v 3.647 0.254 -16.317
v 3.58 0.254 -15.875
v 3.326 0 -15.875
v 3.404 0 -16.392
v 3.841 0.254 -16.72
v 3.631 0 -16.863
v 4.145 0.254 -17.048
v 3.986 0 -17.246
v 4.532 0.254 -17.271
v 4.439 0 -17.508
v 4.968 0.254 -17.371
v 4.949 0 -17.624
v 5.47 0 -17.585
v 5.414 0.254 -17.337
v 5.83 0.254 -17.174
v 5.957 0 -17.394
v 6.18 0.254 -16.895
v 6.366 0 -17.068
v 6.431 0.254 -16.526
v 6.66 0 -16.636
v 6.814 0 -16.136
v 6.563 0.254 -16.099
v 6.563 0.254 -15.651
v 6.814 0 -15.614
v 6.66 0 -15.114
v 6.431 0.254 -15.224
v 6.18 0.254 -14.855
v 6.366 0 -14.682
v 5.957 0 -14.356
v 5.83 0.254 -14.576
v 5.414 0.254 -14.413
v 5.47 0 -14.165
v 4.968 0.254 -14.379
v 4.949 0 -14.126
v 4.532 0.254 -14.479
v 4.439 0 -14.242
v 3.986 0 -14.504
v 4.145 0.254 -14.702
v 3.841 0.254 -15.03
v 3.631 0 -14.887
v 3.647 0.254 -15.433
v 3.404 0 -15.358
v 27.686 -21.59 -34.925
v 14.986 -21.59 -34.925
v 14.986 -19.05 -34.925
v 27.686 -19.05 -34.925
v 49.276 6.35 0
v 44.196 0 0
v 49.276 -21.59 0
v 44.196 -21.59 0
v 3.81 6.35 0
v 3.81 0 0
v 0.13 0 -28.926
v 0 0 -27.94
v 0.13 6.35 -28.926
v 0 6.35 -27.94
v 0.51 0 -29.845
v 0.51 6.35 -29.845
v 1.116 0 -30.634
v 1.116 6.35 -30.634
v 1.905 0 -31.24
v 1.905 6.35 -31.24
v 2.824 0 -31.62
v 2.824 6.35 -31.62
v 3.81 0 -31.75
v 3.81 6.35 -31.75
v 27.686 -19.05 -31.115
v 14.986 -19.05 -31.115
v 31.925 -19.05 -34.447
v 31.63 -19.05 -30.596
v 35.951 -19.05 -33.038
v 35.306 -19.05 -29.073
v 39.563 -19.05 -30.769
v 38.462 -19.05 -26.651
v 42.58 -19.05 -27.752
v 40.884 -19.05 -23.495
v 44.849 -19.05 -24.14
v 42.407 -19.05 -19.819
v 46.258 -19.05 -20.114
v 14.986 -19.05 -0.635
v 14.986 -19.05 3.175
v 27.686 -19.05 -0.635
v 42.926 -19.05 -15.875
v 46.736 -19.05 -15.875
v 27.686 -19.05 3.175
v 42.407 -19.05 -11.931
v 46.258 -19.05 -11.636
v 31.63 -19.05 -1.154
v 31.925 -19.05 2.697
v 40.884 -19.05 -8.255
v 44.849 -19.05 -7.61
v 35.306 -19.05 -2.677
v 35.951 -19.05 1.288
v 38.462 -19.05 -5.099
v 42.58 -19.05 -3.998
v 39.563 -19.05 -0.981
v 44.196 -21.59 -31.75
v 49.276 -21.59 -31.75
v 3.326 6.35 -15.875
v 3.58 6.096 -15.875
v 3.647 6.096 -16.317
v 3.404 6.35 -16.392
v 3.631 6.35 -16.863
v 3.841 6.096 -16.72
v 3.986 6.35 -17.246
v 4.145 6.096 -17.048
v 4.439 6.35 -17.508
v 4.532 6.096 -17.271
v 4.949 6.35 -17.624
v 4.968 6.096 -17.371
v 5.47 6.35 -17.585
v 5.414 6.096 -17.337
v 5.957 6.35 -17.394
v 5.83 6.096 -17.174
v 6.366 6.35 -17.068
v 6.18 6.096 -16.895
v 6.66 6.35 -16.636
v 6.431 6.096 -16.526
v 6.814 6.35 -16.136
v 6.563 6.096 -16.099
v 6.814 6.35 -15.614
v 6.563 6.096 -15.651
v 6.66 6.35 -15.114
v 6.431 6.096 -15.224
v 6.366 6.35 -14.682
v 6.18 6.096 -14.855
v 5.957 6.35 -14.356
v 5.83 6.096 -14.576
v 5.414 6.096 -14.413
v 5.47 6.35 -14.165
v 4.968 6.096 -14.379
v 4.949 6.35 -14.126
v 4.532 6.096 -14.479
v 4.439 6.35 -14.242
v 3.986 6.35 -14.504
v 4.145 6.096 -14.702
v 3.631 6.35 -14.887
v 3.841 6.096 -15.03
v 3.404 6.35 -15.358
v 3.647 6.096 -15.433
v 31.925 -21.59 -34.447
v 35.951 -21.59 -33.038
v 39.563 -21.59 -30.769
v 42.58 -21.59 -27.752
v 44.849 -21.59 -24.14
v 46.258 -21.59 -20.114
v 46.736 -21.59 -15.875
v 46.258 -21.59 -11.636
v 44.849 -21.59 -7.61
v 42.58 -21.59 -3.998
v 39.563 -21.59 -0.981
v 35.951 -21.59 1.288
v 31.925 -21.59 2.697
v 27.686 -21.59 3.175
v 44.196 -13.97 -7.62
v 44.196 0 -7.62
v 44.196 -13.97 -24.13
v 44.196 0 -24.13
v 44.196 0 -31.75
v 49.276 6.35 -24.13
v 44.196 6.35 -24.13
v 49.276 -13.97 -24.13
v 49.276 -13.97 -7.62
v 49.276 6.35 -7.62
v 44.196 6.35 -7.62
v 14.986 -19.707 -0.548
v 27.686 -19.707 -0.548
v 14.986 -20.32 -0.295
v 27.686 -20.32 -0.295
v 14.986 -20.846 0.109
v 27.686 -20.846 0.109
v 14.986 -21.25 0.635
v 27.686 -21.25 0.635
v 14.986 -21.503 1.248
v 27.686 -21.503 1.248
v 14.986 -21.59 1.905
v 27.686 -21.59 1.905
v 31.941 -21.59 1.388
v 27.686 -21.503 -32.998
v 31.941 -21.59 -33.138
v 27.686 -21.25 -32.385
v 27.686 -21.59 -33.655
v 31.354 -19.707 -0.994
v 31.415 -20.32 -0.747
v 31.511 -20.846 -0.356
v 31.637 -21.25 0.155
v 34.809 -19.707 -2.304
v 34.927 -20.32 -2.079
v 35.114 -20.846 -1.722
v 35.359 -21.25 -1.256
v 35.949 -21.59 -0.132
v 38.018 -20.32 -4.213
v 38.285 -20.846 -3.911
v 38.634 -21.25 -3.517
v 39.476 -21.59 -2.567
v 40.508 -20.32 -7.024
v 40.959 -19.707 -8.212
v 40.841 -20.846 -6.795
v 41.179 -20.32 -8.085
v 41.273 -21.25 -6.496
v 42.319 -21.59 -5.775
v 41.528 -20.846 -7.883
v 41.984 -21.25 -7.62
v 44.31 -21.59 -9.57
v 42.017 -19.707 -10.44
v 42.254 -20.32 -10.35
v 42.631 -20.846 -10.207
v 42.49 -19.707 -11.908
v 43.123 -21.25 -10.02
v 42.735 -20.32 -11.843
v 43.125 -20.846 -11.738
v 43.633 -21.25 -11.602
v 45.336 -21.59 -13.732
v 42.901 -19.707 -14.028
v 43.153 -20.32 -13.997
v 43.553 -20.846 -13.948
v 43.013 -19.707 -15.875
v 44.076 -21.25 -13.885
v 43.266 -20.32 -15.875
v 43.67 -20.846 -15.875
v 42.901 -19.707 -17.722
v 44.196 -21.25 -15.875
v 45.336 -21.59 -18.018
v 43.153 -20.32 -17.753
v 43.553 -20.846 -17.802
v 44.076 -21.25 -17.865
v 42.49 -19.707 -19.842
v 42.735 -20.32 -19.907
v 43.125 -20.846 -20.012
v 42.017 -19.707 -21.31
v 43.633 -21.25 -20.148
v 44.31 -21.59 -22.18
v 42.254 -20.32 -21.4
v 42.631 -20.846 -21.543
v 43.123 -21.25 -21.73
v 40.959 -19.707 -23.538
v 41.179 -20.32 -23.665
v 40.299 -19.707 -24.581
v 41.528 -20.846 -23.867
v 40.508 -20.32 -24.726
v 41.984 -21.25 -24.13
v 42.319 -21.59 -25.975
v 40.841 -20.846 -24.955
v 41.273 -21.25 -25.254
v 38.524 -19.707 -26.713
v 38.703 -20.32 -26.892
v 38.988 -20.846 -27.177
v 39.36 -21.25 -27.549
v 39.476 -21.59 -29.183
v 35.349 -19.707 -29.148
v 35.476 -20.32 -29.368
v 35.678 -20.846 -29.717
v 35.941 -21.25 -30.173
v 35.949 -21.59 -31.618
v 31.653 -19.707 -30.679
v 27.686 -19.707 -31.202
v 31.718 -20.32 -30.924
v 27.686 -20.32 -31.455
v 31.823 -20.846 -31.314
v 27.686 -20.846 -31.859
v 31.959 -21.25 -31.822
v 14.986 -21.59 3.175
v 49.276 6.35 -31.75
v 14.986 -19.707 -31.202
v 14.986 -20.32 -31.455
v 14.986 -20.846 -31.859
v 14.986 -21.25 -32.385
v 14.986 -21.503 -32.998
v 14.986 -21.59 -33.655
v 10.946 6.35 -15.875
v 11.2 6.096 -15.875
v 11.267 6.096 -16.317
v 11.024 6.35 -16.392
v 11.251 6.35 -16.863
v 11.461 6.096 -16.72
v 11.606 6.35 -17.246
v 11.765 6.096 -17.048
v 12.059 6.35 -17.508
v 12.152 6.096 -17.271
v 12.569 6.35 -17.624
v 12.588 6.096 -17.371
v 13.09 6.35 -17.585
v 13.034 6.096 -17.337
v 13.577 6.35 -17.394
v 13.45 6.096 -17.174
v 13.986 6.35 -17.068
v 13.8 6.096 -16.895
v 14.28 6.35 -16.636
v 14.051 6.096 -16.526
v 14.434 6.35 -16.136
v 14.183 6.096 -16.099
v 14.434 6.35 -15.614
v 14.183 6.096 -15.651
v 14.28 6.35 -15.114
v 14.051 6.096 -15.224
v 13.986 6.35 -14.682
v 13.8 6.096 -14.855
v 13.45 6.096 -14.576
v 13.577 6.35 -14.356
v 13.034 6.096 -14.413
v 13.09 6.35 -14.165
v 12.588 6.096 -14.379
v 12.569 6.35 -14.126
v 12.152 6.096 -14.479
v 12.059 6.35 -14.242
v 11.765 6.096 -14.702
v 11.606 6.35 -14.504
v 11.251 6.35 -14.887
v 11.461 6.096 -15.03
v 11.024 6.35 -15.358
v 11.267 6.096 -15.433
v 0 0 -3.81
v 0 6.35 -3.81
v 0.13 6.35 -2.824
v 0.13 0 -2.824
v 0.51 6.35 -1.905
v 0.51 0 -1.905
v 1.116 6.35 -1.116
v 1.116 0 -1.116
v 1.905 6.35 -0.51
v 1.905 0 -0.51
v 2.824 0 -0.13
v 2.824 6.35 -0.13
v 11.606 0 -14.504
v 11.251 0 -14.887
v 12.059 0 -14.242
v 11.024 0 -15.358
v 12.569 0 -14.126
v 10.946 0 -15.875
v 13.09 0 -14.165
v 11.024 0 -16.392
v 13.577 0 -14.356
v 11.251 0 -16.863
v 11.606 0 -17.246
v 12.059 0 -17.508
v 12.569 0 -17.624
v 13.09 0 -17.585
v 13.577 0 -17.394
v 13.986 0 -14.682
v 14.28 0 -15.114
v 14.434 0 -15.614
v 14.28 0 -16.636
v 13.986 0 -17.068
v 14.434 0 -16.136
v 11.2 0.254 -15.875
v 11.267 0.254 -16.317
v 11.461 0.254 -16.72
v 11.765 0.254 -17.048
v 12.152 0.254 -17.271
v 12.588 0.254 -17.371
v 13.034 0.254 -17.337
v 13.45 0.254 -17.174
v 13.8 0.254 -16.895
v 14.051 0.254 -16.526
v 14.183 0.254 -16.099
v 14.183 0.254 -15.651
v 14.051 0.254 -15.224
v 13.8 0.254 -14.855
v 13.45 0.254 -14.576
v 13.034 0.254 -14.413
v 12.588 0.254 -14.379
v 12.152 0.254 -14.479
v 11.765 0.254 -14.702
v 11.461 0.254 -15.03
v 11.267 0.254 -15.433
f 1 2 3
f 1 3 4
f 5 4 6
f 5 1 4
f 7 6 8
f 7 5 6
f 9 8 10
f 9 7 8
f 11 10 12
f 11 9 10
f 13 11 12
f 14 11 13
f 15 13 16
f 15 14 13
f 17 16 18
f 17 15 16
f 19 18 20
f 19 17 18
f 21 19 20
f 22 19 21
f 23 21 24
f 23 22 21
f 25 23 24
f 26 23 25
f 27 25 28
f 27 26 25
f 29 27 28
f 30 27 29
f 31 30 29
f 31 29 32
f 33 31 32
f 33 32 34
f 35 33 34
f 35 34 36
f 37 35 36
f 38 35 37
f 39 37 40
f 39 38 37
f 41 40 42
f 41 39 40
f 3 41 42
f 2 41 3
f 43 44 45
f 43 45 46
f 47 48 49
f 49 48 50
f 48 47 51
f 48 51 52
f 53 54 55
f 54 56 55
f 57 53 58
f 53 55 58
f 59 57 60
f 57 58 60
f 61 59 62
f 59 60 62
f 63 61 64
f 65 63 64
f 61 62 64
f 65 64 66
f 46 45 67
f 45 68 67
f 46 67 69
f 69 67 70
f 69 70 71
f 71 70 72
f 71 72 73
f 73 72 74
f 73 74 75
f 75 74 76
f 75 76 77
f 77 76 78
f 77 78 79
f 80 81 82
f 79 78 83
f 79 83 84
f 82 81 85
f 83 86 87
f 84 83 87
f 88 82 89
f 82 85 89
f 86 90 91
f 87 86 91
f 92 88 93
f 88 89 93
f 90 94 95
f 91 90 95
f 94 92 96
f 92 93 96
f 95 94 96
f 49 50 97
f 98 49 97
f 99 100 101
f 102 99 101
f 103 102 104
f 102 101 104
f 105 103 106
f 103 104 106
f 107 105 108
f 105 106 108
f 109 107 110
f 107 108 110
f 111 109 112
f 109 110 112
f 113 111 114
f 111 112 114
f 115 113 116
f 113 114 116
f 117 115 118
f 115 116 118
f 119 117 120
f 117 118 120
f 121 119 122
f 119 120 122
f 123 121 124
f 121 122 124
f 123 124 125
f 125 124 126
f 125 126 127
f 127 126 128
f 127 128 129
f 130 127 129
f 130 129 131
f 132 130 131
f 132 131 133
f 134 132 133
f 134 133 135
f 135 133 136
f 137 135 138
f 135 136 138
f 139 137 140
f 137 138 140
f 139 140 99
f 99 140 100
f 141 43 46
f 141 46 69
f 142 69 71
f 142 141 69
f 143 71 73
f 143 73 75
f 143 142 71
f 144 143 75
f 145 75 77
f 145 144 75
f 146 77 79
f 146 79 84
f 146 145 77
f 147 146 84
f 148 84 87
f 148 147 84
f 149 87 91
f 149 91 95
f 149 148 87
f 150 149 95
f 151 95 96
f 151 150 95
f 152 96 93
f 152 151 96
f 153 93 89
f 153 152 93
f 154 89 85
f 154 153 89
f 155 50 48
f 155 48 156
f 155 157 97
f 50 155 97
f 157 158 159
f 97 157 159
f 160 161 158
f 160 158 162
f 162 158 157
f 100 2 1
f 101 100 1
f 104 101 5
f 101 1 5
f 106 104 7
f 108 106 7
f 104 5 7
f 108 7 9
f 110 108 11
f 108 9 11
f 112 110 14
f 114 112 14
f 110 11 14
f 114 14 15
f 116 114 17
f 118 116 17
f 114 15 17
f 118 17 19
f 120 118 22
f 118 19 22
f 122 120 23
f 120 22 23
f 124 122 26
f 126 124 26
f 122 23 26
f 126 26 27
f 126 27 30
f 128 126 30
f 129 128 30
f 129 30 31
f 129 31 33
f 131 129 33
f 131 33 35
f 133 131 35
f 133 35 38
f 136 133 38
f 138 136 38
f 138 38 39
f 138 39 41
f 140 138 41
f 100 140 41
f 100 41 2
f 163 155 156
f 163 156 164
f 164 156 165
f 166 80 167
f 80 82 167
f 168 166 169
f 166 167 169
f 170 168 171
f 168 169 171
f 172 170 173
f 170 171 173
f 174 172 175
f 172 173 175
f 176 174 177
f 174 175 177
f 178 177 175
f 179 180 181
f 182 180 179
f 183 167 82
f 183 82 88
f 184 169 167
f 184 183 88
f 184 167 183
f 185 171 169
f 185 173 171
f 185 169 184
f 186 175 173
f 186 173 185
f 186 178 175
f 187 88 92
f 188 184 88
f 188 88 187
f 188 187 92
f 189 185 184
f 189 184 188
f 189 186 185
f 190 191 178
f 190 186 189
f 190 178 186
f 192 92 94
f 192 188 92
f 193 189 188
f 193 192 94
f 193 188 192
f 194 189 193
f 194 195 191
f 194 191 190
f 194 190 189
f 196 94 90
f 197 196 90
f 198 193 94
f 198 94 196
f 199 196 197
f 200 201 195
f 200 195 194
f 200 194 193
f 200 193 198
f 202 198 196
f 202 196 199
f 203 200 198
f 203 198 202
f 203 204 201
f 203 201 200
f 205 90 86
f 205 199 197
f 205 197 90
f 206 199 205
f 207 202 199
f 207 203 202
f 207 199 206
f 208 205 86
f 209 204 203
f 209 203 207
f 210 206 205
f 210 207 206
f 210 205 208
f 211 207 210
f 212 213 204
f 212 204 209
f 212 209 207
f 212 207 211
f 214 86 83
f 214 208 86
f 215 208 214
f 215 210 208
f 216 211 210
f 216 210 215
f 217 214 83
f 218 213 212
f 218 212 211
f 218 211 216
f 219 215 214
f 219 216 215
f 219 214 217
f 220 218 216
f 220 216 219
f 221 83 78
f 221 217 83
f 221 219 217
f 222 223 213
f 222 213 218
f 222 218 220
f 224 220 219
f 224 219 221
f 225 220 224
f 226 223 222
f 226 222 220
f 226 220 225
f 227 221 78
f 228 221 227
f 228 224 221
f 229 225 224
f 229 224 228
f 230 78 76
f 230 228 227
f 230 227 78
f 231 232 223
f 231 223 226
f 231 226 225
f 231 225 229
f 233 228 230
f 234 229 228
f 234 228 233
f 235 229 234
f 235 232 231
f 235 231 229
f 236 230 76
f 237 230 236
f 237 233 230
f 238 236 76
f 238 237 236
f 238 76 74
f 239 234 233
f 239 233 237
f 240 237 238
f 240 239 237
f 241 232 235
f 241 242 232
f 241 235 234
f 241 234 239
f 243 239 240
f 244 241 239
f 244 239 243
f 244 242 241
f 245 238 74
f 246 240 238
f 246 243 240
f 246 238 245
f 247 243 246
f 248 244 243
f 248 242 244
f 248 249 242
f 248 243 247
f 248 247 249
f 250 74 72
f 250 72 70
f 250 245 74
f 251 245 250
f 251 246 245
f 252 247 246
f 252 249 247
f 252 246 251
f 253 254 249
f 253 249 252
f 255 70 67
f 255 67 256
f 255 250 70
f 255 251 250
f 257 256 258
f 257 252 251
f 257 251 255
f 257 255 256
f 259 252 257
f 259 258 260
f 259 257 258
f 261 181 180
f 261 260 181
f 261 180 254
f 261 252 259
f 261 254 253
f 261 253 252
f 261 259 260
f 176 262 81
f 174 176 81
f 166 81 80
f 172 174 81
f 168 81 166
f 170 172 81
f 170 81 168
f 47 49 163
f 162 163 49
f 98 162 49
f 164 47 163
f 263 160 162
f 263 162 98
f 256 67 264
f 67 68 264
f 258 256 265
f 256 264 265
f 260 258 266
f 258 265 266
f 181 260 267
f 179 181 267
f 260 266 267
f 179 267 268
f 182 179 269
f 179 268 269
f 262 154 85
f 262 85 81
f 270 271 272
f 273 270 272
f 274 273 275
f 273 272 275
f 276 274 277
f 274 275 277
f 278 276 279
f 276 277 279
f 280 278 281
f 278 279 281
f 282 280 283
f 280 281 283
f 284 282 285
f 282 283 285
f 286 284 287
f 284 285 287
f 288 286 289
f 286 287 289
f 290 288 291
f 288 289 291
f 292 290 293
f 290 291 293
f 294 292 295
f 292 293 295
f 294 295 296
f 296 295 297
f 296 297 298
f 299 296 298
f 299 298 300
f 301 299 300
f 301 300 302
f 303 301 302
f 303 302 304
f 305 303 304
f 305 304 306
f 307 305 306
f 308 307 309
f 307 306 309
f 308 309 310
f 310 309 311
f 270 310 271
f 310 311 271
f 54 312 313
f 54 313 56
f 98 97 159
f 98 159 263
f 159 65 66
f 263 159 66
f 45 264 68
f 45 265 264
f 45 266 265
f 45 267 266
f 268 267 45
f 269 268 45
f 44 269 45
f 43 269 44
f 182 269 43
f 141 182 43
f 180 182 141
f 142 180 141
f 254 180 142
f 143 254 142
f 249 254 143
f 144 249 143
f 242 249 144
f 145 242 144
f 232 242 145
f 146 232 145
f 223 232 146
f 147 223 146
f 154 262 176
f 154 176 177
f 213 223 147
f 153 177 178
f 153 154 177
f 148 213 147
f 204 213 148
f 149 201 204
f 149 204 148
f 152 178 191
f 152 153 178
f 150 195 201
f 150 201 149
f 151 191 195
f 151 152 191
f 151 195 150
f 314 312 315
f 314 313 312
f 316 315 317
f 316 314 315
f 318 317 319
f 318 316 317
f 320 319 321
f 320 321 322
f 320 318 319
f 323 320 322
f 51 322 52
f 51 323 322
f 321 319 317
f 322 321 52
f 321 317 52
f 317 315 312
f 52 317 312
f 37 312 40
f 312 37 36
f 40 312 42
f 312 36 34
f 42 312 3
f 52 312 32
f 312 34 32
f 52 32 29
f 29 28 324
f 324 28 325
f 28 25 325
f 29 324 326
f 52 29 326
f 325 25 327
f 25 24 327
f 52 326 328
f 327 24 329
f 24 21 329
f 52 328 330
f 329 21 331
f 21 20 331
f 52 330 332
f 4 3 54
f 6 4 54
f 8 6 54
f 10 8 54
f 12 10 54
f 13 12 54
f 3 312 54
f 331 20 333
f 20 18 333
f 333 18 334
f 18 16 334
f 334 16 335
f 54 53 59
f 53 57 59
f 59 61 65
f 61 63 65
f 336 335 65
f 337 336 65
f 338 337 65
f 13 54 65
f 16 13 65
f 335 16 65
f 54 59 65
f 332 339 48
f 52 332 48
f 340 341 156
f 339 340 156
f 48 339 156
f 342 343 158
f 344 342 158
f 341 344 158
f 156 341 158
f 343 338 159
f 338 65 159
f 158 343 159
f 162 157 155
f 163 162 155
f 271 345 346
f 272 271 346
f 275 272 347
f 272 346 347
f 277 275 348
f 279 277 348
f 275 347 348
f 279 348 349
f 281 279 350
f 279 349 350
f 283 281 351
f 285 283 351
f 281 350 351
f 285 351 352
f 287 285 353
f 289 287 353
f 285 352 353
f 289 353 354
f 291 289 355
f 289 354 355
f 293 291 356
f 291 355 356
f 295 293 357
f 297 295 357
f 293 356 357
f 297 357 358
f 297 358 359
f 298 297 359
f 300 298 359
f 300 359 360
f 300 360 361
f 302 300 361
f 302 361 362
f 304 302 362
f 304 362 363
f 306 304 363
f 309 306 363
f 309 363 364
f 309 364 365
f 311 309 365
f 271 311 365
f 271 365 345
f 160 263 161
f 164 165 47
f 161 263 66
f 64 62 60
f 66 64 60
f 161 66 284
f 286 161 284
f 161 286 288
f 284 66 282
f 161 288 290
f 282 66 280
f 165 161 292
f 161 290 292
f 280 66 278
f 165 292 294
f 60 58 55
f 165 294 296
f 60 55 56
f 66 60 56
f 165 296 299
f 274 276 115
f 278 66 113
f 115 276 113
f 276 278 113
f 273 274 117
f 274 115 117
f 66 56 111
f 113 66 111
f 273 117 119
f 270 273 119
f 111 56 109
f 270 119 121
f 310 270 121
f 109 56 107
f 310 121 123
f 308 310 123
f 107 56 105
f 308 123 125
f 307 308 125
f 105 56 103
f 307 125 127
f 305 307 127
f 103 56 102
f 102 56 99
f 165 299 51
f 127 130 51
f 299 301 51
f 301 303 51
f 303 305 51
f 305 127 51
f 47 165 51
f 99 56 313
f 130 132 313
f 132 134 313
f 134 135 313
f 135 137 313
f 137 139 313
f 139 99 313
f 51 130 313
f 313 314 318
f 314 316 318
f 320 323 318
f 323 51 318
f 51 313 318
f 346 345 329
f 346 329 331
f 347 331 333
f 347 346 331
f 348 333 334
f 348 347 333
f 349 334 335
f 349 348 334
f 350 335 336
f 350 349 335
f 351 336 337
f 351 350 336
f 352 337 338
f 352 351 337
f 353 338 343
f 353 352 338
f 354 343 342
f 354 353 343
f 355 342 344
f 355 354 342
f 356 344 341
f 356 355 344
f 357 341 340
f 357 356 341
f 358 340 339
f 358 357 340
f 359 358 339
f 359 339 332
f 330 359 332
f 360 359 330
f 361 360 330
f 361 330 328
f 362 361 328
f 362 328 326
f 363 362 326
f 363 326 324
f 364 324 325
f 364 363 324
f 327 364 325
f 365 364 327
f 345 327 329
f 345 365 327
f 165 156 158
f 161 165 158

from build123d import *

# Parameters (mm, degrees)
SKETCH1_W             = 44.196
SKETCH1_H             = 31.75
BOSS_EXTRUDE1_DEPTH   = 6.35
F_3_0MM_DOWEL_HOLE1_D = 3
CHAMFER1_SIZE         = 0.254
FILLET2_R             = 3.81
BOSS_EXTRUDE4_DEPTH   = 5.08
EXTRUDE_THIN1_DEPTH   = 2.54
FILLET3_R             = 2.54


with BuildPart() as part:
    # Sketch1 → Boss-Extrude1 (new body)
    with BuildSketch(Plane(origin=(0, 0, 0), x_dir=(1, 0, 0), z_dir=(0, 1, 0))):
        with Locations((22.098, 15.875)):
            Rectangle(SKETCH1_W, SKETCH1_H)
    extrude(amount=BOSS_EXTRUDE1_DEPTH)

    # Ø3.0mm Dowel Hole1 (through all)
    with Locations(Plane(origin=(0, 6.35, 0), x_dir=(1, 0, 0), z_dir=(0, 1, 0))):
        with Locations((5.08, 15.875), (12.7, 15.875)):
            Hole(F_3_0MM_DOWEL_HOLE1_D / 2)

    # Chamfer1
    chamfer1_edges = [part.edges().sort_by_distance(p)[0] for p in [
        (14.2, 6.35, -15.875),
        (14.2, 0, -15.875),
        (6.58, 6.35, -15.875),
        (6.58, 0, -15.875),
    ]]
    chamfer(chamfer1_edges, length=CHAMFER1_SIZE)

    # Fillet2
    fillet2_edges = [part.edges().sort_by_distance(p)[0] for p in [
        (0, 3.175, -31.75),
        (0, 3.175, 0),
    ]]
    fillet(fillet2_edges, radius=FILLET2_R)

    # Sketch6 → Boss-Extrude4 (add)
    with BuildSketch(Plane(origin=(44.196, 0, 0), x_dir=(0, 0, -1), z_dir=(1, 0, 0))):
        Polygon((0, 6.35), (0, -21.59), (31.75, -21.59), (31.75, 6.35), (24.13, 6.35), (24.13, -13.97), (7.62, -13.97), (7.62, 6.35), align=None)
    extrude(amount=BOSS_EXTRUDE4_DEPTH)


with BuildPart() as body_2:
    # Sketch8 → Extrude-Thin1 (new body)
    with BuildSketch(Plane.XZ.offset(21.59)):
        with BuildLine():
            Line((14.986, -34.925), (27.686, -34.925))
            ThreePointArc((27.686, -34.925), (46.736, -15.875), (27.686, 3.175))
            Line((27.686, 3.175), (14.986, 3.175))
            Line((14.986, 3.175), (14.986, -0.635))
            Line((14.986, -0.635), (27.686, -0.635))
            ThreePointArc((27.686, -0.635), (42.926, -15.875), (27.686, -31.115))
            Line((27.686, -31.115), (14.986, -31.115))
            Line((14.986, -31.115), (14.986, -34.925))
        make_face()
    extrude(amount=-EXTRUDE_THIN1_DEPTH)

    # Fillet3
    fillet3_edges = [body_2.edges().sort_by_distance(p)[0] for p in [
        (21.336, -21.59, -0.635),
        (21.336, -21.59, -31.115),
        (42.926, -21.59, -15.875),
    ]]
    fillet(fillet3_edges, radius=FILLET3_R - 0.0001)  # a hair under: the kernel refuses the full size


solid = Compound([part.part, body_2.part])
